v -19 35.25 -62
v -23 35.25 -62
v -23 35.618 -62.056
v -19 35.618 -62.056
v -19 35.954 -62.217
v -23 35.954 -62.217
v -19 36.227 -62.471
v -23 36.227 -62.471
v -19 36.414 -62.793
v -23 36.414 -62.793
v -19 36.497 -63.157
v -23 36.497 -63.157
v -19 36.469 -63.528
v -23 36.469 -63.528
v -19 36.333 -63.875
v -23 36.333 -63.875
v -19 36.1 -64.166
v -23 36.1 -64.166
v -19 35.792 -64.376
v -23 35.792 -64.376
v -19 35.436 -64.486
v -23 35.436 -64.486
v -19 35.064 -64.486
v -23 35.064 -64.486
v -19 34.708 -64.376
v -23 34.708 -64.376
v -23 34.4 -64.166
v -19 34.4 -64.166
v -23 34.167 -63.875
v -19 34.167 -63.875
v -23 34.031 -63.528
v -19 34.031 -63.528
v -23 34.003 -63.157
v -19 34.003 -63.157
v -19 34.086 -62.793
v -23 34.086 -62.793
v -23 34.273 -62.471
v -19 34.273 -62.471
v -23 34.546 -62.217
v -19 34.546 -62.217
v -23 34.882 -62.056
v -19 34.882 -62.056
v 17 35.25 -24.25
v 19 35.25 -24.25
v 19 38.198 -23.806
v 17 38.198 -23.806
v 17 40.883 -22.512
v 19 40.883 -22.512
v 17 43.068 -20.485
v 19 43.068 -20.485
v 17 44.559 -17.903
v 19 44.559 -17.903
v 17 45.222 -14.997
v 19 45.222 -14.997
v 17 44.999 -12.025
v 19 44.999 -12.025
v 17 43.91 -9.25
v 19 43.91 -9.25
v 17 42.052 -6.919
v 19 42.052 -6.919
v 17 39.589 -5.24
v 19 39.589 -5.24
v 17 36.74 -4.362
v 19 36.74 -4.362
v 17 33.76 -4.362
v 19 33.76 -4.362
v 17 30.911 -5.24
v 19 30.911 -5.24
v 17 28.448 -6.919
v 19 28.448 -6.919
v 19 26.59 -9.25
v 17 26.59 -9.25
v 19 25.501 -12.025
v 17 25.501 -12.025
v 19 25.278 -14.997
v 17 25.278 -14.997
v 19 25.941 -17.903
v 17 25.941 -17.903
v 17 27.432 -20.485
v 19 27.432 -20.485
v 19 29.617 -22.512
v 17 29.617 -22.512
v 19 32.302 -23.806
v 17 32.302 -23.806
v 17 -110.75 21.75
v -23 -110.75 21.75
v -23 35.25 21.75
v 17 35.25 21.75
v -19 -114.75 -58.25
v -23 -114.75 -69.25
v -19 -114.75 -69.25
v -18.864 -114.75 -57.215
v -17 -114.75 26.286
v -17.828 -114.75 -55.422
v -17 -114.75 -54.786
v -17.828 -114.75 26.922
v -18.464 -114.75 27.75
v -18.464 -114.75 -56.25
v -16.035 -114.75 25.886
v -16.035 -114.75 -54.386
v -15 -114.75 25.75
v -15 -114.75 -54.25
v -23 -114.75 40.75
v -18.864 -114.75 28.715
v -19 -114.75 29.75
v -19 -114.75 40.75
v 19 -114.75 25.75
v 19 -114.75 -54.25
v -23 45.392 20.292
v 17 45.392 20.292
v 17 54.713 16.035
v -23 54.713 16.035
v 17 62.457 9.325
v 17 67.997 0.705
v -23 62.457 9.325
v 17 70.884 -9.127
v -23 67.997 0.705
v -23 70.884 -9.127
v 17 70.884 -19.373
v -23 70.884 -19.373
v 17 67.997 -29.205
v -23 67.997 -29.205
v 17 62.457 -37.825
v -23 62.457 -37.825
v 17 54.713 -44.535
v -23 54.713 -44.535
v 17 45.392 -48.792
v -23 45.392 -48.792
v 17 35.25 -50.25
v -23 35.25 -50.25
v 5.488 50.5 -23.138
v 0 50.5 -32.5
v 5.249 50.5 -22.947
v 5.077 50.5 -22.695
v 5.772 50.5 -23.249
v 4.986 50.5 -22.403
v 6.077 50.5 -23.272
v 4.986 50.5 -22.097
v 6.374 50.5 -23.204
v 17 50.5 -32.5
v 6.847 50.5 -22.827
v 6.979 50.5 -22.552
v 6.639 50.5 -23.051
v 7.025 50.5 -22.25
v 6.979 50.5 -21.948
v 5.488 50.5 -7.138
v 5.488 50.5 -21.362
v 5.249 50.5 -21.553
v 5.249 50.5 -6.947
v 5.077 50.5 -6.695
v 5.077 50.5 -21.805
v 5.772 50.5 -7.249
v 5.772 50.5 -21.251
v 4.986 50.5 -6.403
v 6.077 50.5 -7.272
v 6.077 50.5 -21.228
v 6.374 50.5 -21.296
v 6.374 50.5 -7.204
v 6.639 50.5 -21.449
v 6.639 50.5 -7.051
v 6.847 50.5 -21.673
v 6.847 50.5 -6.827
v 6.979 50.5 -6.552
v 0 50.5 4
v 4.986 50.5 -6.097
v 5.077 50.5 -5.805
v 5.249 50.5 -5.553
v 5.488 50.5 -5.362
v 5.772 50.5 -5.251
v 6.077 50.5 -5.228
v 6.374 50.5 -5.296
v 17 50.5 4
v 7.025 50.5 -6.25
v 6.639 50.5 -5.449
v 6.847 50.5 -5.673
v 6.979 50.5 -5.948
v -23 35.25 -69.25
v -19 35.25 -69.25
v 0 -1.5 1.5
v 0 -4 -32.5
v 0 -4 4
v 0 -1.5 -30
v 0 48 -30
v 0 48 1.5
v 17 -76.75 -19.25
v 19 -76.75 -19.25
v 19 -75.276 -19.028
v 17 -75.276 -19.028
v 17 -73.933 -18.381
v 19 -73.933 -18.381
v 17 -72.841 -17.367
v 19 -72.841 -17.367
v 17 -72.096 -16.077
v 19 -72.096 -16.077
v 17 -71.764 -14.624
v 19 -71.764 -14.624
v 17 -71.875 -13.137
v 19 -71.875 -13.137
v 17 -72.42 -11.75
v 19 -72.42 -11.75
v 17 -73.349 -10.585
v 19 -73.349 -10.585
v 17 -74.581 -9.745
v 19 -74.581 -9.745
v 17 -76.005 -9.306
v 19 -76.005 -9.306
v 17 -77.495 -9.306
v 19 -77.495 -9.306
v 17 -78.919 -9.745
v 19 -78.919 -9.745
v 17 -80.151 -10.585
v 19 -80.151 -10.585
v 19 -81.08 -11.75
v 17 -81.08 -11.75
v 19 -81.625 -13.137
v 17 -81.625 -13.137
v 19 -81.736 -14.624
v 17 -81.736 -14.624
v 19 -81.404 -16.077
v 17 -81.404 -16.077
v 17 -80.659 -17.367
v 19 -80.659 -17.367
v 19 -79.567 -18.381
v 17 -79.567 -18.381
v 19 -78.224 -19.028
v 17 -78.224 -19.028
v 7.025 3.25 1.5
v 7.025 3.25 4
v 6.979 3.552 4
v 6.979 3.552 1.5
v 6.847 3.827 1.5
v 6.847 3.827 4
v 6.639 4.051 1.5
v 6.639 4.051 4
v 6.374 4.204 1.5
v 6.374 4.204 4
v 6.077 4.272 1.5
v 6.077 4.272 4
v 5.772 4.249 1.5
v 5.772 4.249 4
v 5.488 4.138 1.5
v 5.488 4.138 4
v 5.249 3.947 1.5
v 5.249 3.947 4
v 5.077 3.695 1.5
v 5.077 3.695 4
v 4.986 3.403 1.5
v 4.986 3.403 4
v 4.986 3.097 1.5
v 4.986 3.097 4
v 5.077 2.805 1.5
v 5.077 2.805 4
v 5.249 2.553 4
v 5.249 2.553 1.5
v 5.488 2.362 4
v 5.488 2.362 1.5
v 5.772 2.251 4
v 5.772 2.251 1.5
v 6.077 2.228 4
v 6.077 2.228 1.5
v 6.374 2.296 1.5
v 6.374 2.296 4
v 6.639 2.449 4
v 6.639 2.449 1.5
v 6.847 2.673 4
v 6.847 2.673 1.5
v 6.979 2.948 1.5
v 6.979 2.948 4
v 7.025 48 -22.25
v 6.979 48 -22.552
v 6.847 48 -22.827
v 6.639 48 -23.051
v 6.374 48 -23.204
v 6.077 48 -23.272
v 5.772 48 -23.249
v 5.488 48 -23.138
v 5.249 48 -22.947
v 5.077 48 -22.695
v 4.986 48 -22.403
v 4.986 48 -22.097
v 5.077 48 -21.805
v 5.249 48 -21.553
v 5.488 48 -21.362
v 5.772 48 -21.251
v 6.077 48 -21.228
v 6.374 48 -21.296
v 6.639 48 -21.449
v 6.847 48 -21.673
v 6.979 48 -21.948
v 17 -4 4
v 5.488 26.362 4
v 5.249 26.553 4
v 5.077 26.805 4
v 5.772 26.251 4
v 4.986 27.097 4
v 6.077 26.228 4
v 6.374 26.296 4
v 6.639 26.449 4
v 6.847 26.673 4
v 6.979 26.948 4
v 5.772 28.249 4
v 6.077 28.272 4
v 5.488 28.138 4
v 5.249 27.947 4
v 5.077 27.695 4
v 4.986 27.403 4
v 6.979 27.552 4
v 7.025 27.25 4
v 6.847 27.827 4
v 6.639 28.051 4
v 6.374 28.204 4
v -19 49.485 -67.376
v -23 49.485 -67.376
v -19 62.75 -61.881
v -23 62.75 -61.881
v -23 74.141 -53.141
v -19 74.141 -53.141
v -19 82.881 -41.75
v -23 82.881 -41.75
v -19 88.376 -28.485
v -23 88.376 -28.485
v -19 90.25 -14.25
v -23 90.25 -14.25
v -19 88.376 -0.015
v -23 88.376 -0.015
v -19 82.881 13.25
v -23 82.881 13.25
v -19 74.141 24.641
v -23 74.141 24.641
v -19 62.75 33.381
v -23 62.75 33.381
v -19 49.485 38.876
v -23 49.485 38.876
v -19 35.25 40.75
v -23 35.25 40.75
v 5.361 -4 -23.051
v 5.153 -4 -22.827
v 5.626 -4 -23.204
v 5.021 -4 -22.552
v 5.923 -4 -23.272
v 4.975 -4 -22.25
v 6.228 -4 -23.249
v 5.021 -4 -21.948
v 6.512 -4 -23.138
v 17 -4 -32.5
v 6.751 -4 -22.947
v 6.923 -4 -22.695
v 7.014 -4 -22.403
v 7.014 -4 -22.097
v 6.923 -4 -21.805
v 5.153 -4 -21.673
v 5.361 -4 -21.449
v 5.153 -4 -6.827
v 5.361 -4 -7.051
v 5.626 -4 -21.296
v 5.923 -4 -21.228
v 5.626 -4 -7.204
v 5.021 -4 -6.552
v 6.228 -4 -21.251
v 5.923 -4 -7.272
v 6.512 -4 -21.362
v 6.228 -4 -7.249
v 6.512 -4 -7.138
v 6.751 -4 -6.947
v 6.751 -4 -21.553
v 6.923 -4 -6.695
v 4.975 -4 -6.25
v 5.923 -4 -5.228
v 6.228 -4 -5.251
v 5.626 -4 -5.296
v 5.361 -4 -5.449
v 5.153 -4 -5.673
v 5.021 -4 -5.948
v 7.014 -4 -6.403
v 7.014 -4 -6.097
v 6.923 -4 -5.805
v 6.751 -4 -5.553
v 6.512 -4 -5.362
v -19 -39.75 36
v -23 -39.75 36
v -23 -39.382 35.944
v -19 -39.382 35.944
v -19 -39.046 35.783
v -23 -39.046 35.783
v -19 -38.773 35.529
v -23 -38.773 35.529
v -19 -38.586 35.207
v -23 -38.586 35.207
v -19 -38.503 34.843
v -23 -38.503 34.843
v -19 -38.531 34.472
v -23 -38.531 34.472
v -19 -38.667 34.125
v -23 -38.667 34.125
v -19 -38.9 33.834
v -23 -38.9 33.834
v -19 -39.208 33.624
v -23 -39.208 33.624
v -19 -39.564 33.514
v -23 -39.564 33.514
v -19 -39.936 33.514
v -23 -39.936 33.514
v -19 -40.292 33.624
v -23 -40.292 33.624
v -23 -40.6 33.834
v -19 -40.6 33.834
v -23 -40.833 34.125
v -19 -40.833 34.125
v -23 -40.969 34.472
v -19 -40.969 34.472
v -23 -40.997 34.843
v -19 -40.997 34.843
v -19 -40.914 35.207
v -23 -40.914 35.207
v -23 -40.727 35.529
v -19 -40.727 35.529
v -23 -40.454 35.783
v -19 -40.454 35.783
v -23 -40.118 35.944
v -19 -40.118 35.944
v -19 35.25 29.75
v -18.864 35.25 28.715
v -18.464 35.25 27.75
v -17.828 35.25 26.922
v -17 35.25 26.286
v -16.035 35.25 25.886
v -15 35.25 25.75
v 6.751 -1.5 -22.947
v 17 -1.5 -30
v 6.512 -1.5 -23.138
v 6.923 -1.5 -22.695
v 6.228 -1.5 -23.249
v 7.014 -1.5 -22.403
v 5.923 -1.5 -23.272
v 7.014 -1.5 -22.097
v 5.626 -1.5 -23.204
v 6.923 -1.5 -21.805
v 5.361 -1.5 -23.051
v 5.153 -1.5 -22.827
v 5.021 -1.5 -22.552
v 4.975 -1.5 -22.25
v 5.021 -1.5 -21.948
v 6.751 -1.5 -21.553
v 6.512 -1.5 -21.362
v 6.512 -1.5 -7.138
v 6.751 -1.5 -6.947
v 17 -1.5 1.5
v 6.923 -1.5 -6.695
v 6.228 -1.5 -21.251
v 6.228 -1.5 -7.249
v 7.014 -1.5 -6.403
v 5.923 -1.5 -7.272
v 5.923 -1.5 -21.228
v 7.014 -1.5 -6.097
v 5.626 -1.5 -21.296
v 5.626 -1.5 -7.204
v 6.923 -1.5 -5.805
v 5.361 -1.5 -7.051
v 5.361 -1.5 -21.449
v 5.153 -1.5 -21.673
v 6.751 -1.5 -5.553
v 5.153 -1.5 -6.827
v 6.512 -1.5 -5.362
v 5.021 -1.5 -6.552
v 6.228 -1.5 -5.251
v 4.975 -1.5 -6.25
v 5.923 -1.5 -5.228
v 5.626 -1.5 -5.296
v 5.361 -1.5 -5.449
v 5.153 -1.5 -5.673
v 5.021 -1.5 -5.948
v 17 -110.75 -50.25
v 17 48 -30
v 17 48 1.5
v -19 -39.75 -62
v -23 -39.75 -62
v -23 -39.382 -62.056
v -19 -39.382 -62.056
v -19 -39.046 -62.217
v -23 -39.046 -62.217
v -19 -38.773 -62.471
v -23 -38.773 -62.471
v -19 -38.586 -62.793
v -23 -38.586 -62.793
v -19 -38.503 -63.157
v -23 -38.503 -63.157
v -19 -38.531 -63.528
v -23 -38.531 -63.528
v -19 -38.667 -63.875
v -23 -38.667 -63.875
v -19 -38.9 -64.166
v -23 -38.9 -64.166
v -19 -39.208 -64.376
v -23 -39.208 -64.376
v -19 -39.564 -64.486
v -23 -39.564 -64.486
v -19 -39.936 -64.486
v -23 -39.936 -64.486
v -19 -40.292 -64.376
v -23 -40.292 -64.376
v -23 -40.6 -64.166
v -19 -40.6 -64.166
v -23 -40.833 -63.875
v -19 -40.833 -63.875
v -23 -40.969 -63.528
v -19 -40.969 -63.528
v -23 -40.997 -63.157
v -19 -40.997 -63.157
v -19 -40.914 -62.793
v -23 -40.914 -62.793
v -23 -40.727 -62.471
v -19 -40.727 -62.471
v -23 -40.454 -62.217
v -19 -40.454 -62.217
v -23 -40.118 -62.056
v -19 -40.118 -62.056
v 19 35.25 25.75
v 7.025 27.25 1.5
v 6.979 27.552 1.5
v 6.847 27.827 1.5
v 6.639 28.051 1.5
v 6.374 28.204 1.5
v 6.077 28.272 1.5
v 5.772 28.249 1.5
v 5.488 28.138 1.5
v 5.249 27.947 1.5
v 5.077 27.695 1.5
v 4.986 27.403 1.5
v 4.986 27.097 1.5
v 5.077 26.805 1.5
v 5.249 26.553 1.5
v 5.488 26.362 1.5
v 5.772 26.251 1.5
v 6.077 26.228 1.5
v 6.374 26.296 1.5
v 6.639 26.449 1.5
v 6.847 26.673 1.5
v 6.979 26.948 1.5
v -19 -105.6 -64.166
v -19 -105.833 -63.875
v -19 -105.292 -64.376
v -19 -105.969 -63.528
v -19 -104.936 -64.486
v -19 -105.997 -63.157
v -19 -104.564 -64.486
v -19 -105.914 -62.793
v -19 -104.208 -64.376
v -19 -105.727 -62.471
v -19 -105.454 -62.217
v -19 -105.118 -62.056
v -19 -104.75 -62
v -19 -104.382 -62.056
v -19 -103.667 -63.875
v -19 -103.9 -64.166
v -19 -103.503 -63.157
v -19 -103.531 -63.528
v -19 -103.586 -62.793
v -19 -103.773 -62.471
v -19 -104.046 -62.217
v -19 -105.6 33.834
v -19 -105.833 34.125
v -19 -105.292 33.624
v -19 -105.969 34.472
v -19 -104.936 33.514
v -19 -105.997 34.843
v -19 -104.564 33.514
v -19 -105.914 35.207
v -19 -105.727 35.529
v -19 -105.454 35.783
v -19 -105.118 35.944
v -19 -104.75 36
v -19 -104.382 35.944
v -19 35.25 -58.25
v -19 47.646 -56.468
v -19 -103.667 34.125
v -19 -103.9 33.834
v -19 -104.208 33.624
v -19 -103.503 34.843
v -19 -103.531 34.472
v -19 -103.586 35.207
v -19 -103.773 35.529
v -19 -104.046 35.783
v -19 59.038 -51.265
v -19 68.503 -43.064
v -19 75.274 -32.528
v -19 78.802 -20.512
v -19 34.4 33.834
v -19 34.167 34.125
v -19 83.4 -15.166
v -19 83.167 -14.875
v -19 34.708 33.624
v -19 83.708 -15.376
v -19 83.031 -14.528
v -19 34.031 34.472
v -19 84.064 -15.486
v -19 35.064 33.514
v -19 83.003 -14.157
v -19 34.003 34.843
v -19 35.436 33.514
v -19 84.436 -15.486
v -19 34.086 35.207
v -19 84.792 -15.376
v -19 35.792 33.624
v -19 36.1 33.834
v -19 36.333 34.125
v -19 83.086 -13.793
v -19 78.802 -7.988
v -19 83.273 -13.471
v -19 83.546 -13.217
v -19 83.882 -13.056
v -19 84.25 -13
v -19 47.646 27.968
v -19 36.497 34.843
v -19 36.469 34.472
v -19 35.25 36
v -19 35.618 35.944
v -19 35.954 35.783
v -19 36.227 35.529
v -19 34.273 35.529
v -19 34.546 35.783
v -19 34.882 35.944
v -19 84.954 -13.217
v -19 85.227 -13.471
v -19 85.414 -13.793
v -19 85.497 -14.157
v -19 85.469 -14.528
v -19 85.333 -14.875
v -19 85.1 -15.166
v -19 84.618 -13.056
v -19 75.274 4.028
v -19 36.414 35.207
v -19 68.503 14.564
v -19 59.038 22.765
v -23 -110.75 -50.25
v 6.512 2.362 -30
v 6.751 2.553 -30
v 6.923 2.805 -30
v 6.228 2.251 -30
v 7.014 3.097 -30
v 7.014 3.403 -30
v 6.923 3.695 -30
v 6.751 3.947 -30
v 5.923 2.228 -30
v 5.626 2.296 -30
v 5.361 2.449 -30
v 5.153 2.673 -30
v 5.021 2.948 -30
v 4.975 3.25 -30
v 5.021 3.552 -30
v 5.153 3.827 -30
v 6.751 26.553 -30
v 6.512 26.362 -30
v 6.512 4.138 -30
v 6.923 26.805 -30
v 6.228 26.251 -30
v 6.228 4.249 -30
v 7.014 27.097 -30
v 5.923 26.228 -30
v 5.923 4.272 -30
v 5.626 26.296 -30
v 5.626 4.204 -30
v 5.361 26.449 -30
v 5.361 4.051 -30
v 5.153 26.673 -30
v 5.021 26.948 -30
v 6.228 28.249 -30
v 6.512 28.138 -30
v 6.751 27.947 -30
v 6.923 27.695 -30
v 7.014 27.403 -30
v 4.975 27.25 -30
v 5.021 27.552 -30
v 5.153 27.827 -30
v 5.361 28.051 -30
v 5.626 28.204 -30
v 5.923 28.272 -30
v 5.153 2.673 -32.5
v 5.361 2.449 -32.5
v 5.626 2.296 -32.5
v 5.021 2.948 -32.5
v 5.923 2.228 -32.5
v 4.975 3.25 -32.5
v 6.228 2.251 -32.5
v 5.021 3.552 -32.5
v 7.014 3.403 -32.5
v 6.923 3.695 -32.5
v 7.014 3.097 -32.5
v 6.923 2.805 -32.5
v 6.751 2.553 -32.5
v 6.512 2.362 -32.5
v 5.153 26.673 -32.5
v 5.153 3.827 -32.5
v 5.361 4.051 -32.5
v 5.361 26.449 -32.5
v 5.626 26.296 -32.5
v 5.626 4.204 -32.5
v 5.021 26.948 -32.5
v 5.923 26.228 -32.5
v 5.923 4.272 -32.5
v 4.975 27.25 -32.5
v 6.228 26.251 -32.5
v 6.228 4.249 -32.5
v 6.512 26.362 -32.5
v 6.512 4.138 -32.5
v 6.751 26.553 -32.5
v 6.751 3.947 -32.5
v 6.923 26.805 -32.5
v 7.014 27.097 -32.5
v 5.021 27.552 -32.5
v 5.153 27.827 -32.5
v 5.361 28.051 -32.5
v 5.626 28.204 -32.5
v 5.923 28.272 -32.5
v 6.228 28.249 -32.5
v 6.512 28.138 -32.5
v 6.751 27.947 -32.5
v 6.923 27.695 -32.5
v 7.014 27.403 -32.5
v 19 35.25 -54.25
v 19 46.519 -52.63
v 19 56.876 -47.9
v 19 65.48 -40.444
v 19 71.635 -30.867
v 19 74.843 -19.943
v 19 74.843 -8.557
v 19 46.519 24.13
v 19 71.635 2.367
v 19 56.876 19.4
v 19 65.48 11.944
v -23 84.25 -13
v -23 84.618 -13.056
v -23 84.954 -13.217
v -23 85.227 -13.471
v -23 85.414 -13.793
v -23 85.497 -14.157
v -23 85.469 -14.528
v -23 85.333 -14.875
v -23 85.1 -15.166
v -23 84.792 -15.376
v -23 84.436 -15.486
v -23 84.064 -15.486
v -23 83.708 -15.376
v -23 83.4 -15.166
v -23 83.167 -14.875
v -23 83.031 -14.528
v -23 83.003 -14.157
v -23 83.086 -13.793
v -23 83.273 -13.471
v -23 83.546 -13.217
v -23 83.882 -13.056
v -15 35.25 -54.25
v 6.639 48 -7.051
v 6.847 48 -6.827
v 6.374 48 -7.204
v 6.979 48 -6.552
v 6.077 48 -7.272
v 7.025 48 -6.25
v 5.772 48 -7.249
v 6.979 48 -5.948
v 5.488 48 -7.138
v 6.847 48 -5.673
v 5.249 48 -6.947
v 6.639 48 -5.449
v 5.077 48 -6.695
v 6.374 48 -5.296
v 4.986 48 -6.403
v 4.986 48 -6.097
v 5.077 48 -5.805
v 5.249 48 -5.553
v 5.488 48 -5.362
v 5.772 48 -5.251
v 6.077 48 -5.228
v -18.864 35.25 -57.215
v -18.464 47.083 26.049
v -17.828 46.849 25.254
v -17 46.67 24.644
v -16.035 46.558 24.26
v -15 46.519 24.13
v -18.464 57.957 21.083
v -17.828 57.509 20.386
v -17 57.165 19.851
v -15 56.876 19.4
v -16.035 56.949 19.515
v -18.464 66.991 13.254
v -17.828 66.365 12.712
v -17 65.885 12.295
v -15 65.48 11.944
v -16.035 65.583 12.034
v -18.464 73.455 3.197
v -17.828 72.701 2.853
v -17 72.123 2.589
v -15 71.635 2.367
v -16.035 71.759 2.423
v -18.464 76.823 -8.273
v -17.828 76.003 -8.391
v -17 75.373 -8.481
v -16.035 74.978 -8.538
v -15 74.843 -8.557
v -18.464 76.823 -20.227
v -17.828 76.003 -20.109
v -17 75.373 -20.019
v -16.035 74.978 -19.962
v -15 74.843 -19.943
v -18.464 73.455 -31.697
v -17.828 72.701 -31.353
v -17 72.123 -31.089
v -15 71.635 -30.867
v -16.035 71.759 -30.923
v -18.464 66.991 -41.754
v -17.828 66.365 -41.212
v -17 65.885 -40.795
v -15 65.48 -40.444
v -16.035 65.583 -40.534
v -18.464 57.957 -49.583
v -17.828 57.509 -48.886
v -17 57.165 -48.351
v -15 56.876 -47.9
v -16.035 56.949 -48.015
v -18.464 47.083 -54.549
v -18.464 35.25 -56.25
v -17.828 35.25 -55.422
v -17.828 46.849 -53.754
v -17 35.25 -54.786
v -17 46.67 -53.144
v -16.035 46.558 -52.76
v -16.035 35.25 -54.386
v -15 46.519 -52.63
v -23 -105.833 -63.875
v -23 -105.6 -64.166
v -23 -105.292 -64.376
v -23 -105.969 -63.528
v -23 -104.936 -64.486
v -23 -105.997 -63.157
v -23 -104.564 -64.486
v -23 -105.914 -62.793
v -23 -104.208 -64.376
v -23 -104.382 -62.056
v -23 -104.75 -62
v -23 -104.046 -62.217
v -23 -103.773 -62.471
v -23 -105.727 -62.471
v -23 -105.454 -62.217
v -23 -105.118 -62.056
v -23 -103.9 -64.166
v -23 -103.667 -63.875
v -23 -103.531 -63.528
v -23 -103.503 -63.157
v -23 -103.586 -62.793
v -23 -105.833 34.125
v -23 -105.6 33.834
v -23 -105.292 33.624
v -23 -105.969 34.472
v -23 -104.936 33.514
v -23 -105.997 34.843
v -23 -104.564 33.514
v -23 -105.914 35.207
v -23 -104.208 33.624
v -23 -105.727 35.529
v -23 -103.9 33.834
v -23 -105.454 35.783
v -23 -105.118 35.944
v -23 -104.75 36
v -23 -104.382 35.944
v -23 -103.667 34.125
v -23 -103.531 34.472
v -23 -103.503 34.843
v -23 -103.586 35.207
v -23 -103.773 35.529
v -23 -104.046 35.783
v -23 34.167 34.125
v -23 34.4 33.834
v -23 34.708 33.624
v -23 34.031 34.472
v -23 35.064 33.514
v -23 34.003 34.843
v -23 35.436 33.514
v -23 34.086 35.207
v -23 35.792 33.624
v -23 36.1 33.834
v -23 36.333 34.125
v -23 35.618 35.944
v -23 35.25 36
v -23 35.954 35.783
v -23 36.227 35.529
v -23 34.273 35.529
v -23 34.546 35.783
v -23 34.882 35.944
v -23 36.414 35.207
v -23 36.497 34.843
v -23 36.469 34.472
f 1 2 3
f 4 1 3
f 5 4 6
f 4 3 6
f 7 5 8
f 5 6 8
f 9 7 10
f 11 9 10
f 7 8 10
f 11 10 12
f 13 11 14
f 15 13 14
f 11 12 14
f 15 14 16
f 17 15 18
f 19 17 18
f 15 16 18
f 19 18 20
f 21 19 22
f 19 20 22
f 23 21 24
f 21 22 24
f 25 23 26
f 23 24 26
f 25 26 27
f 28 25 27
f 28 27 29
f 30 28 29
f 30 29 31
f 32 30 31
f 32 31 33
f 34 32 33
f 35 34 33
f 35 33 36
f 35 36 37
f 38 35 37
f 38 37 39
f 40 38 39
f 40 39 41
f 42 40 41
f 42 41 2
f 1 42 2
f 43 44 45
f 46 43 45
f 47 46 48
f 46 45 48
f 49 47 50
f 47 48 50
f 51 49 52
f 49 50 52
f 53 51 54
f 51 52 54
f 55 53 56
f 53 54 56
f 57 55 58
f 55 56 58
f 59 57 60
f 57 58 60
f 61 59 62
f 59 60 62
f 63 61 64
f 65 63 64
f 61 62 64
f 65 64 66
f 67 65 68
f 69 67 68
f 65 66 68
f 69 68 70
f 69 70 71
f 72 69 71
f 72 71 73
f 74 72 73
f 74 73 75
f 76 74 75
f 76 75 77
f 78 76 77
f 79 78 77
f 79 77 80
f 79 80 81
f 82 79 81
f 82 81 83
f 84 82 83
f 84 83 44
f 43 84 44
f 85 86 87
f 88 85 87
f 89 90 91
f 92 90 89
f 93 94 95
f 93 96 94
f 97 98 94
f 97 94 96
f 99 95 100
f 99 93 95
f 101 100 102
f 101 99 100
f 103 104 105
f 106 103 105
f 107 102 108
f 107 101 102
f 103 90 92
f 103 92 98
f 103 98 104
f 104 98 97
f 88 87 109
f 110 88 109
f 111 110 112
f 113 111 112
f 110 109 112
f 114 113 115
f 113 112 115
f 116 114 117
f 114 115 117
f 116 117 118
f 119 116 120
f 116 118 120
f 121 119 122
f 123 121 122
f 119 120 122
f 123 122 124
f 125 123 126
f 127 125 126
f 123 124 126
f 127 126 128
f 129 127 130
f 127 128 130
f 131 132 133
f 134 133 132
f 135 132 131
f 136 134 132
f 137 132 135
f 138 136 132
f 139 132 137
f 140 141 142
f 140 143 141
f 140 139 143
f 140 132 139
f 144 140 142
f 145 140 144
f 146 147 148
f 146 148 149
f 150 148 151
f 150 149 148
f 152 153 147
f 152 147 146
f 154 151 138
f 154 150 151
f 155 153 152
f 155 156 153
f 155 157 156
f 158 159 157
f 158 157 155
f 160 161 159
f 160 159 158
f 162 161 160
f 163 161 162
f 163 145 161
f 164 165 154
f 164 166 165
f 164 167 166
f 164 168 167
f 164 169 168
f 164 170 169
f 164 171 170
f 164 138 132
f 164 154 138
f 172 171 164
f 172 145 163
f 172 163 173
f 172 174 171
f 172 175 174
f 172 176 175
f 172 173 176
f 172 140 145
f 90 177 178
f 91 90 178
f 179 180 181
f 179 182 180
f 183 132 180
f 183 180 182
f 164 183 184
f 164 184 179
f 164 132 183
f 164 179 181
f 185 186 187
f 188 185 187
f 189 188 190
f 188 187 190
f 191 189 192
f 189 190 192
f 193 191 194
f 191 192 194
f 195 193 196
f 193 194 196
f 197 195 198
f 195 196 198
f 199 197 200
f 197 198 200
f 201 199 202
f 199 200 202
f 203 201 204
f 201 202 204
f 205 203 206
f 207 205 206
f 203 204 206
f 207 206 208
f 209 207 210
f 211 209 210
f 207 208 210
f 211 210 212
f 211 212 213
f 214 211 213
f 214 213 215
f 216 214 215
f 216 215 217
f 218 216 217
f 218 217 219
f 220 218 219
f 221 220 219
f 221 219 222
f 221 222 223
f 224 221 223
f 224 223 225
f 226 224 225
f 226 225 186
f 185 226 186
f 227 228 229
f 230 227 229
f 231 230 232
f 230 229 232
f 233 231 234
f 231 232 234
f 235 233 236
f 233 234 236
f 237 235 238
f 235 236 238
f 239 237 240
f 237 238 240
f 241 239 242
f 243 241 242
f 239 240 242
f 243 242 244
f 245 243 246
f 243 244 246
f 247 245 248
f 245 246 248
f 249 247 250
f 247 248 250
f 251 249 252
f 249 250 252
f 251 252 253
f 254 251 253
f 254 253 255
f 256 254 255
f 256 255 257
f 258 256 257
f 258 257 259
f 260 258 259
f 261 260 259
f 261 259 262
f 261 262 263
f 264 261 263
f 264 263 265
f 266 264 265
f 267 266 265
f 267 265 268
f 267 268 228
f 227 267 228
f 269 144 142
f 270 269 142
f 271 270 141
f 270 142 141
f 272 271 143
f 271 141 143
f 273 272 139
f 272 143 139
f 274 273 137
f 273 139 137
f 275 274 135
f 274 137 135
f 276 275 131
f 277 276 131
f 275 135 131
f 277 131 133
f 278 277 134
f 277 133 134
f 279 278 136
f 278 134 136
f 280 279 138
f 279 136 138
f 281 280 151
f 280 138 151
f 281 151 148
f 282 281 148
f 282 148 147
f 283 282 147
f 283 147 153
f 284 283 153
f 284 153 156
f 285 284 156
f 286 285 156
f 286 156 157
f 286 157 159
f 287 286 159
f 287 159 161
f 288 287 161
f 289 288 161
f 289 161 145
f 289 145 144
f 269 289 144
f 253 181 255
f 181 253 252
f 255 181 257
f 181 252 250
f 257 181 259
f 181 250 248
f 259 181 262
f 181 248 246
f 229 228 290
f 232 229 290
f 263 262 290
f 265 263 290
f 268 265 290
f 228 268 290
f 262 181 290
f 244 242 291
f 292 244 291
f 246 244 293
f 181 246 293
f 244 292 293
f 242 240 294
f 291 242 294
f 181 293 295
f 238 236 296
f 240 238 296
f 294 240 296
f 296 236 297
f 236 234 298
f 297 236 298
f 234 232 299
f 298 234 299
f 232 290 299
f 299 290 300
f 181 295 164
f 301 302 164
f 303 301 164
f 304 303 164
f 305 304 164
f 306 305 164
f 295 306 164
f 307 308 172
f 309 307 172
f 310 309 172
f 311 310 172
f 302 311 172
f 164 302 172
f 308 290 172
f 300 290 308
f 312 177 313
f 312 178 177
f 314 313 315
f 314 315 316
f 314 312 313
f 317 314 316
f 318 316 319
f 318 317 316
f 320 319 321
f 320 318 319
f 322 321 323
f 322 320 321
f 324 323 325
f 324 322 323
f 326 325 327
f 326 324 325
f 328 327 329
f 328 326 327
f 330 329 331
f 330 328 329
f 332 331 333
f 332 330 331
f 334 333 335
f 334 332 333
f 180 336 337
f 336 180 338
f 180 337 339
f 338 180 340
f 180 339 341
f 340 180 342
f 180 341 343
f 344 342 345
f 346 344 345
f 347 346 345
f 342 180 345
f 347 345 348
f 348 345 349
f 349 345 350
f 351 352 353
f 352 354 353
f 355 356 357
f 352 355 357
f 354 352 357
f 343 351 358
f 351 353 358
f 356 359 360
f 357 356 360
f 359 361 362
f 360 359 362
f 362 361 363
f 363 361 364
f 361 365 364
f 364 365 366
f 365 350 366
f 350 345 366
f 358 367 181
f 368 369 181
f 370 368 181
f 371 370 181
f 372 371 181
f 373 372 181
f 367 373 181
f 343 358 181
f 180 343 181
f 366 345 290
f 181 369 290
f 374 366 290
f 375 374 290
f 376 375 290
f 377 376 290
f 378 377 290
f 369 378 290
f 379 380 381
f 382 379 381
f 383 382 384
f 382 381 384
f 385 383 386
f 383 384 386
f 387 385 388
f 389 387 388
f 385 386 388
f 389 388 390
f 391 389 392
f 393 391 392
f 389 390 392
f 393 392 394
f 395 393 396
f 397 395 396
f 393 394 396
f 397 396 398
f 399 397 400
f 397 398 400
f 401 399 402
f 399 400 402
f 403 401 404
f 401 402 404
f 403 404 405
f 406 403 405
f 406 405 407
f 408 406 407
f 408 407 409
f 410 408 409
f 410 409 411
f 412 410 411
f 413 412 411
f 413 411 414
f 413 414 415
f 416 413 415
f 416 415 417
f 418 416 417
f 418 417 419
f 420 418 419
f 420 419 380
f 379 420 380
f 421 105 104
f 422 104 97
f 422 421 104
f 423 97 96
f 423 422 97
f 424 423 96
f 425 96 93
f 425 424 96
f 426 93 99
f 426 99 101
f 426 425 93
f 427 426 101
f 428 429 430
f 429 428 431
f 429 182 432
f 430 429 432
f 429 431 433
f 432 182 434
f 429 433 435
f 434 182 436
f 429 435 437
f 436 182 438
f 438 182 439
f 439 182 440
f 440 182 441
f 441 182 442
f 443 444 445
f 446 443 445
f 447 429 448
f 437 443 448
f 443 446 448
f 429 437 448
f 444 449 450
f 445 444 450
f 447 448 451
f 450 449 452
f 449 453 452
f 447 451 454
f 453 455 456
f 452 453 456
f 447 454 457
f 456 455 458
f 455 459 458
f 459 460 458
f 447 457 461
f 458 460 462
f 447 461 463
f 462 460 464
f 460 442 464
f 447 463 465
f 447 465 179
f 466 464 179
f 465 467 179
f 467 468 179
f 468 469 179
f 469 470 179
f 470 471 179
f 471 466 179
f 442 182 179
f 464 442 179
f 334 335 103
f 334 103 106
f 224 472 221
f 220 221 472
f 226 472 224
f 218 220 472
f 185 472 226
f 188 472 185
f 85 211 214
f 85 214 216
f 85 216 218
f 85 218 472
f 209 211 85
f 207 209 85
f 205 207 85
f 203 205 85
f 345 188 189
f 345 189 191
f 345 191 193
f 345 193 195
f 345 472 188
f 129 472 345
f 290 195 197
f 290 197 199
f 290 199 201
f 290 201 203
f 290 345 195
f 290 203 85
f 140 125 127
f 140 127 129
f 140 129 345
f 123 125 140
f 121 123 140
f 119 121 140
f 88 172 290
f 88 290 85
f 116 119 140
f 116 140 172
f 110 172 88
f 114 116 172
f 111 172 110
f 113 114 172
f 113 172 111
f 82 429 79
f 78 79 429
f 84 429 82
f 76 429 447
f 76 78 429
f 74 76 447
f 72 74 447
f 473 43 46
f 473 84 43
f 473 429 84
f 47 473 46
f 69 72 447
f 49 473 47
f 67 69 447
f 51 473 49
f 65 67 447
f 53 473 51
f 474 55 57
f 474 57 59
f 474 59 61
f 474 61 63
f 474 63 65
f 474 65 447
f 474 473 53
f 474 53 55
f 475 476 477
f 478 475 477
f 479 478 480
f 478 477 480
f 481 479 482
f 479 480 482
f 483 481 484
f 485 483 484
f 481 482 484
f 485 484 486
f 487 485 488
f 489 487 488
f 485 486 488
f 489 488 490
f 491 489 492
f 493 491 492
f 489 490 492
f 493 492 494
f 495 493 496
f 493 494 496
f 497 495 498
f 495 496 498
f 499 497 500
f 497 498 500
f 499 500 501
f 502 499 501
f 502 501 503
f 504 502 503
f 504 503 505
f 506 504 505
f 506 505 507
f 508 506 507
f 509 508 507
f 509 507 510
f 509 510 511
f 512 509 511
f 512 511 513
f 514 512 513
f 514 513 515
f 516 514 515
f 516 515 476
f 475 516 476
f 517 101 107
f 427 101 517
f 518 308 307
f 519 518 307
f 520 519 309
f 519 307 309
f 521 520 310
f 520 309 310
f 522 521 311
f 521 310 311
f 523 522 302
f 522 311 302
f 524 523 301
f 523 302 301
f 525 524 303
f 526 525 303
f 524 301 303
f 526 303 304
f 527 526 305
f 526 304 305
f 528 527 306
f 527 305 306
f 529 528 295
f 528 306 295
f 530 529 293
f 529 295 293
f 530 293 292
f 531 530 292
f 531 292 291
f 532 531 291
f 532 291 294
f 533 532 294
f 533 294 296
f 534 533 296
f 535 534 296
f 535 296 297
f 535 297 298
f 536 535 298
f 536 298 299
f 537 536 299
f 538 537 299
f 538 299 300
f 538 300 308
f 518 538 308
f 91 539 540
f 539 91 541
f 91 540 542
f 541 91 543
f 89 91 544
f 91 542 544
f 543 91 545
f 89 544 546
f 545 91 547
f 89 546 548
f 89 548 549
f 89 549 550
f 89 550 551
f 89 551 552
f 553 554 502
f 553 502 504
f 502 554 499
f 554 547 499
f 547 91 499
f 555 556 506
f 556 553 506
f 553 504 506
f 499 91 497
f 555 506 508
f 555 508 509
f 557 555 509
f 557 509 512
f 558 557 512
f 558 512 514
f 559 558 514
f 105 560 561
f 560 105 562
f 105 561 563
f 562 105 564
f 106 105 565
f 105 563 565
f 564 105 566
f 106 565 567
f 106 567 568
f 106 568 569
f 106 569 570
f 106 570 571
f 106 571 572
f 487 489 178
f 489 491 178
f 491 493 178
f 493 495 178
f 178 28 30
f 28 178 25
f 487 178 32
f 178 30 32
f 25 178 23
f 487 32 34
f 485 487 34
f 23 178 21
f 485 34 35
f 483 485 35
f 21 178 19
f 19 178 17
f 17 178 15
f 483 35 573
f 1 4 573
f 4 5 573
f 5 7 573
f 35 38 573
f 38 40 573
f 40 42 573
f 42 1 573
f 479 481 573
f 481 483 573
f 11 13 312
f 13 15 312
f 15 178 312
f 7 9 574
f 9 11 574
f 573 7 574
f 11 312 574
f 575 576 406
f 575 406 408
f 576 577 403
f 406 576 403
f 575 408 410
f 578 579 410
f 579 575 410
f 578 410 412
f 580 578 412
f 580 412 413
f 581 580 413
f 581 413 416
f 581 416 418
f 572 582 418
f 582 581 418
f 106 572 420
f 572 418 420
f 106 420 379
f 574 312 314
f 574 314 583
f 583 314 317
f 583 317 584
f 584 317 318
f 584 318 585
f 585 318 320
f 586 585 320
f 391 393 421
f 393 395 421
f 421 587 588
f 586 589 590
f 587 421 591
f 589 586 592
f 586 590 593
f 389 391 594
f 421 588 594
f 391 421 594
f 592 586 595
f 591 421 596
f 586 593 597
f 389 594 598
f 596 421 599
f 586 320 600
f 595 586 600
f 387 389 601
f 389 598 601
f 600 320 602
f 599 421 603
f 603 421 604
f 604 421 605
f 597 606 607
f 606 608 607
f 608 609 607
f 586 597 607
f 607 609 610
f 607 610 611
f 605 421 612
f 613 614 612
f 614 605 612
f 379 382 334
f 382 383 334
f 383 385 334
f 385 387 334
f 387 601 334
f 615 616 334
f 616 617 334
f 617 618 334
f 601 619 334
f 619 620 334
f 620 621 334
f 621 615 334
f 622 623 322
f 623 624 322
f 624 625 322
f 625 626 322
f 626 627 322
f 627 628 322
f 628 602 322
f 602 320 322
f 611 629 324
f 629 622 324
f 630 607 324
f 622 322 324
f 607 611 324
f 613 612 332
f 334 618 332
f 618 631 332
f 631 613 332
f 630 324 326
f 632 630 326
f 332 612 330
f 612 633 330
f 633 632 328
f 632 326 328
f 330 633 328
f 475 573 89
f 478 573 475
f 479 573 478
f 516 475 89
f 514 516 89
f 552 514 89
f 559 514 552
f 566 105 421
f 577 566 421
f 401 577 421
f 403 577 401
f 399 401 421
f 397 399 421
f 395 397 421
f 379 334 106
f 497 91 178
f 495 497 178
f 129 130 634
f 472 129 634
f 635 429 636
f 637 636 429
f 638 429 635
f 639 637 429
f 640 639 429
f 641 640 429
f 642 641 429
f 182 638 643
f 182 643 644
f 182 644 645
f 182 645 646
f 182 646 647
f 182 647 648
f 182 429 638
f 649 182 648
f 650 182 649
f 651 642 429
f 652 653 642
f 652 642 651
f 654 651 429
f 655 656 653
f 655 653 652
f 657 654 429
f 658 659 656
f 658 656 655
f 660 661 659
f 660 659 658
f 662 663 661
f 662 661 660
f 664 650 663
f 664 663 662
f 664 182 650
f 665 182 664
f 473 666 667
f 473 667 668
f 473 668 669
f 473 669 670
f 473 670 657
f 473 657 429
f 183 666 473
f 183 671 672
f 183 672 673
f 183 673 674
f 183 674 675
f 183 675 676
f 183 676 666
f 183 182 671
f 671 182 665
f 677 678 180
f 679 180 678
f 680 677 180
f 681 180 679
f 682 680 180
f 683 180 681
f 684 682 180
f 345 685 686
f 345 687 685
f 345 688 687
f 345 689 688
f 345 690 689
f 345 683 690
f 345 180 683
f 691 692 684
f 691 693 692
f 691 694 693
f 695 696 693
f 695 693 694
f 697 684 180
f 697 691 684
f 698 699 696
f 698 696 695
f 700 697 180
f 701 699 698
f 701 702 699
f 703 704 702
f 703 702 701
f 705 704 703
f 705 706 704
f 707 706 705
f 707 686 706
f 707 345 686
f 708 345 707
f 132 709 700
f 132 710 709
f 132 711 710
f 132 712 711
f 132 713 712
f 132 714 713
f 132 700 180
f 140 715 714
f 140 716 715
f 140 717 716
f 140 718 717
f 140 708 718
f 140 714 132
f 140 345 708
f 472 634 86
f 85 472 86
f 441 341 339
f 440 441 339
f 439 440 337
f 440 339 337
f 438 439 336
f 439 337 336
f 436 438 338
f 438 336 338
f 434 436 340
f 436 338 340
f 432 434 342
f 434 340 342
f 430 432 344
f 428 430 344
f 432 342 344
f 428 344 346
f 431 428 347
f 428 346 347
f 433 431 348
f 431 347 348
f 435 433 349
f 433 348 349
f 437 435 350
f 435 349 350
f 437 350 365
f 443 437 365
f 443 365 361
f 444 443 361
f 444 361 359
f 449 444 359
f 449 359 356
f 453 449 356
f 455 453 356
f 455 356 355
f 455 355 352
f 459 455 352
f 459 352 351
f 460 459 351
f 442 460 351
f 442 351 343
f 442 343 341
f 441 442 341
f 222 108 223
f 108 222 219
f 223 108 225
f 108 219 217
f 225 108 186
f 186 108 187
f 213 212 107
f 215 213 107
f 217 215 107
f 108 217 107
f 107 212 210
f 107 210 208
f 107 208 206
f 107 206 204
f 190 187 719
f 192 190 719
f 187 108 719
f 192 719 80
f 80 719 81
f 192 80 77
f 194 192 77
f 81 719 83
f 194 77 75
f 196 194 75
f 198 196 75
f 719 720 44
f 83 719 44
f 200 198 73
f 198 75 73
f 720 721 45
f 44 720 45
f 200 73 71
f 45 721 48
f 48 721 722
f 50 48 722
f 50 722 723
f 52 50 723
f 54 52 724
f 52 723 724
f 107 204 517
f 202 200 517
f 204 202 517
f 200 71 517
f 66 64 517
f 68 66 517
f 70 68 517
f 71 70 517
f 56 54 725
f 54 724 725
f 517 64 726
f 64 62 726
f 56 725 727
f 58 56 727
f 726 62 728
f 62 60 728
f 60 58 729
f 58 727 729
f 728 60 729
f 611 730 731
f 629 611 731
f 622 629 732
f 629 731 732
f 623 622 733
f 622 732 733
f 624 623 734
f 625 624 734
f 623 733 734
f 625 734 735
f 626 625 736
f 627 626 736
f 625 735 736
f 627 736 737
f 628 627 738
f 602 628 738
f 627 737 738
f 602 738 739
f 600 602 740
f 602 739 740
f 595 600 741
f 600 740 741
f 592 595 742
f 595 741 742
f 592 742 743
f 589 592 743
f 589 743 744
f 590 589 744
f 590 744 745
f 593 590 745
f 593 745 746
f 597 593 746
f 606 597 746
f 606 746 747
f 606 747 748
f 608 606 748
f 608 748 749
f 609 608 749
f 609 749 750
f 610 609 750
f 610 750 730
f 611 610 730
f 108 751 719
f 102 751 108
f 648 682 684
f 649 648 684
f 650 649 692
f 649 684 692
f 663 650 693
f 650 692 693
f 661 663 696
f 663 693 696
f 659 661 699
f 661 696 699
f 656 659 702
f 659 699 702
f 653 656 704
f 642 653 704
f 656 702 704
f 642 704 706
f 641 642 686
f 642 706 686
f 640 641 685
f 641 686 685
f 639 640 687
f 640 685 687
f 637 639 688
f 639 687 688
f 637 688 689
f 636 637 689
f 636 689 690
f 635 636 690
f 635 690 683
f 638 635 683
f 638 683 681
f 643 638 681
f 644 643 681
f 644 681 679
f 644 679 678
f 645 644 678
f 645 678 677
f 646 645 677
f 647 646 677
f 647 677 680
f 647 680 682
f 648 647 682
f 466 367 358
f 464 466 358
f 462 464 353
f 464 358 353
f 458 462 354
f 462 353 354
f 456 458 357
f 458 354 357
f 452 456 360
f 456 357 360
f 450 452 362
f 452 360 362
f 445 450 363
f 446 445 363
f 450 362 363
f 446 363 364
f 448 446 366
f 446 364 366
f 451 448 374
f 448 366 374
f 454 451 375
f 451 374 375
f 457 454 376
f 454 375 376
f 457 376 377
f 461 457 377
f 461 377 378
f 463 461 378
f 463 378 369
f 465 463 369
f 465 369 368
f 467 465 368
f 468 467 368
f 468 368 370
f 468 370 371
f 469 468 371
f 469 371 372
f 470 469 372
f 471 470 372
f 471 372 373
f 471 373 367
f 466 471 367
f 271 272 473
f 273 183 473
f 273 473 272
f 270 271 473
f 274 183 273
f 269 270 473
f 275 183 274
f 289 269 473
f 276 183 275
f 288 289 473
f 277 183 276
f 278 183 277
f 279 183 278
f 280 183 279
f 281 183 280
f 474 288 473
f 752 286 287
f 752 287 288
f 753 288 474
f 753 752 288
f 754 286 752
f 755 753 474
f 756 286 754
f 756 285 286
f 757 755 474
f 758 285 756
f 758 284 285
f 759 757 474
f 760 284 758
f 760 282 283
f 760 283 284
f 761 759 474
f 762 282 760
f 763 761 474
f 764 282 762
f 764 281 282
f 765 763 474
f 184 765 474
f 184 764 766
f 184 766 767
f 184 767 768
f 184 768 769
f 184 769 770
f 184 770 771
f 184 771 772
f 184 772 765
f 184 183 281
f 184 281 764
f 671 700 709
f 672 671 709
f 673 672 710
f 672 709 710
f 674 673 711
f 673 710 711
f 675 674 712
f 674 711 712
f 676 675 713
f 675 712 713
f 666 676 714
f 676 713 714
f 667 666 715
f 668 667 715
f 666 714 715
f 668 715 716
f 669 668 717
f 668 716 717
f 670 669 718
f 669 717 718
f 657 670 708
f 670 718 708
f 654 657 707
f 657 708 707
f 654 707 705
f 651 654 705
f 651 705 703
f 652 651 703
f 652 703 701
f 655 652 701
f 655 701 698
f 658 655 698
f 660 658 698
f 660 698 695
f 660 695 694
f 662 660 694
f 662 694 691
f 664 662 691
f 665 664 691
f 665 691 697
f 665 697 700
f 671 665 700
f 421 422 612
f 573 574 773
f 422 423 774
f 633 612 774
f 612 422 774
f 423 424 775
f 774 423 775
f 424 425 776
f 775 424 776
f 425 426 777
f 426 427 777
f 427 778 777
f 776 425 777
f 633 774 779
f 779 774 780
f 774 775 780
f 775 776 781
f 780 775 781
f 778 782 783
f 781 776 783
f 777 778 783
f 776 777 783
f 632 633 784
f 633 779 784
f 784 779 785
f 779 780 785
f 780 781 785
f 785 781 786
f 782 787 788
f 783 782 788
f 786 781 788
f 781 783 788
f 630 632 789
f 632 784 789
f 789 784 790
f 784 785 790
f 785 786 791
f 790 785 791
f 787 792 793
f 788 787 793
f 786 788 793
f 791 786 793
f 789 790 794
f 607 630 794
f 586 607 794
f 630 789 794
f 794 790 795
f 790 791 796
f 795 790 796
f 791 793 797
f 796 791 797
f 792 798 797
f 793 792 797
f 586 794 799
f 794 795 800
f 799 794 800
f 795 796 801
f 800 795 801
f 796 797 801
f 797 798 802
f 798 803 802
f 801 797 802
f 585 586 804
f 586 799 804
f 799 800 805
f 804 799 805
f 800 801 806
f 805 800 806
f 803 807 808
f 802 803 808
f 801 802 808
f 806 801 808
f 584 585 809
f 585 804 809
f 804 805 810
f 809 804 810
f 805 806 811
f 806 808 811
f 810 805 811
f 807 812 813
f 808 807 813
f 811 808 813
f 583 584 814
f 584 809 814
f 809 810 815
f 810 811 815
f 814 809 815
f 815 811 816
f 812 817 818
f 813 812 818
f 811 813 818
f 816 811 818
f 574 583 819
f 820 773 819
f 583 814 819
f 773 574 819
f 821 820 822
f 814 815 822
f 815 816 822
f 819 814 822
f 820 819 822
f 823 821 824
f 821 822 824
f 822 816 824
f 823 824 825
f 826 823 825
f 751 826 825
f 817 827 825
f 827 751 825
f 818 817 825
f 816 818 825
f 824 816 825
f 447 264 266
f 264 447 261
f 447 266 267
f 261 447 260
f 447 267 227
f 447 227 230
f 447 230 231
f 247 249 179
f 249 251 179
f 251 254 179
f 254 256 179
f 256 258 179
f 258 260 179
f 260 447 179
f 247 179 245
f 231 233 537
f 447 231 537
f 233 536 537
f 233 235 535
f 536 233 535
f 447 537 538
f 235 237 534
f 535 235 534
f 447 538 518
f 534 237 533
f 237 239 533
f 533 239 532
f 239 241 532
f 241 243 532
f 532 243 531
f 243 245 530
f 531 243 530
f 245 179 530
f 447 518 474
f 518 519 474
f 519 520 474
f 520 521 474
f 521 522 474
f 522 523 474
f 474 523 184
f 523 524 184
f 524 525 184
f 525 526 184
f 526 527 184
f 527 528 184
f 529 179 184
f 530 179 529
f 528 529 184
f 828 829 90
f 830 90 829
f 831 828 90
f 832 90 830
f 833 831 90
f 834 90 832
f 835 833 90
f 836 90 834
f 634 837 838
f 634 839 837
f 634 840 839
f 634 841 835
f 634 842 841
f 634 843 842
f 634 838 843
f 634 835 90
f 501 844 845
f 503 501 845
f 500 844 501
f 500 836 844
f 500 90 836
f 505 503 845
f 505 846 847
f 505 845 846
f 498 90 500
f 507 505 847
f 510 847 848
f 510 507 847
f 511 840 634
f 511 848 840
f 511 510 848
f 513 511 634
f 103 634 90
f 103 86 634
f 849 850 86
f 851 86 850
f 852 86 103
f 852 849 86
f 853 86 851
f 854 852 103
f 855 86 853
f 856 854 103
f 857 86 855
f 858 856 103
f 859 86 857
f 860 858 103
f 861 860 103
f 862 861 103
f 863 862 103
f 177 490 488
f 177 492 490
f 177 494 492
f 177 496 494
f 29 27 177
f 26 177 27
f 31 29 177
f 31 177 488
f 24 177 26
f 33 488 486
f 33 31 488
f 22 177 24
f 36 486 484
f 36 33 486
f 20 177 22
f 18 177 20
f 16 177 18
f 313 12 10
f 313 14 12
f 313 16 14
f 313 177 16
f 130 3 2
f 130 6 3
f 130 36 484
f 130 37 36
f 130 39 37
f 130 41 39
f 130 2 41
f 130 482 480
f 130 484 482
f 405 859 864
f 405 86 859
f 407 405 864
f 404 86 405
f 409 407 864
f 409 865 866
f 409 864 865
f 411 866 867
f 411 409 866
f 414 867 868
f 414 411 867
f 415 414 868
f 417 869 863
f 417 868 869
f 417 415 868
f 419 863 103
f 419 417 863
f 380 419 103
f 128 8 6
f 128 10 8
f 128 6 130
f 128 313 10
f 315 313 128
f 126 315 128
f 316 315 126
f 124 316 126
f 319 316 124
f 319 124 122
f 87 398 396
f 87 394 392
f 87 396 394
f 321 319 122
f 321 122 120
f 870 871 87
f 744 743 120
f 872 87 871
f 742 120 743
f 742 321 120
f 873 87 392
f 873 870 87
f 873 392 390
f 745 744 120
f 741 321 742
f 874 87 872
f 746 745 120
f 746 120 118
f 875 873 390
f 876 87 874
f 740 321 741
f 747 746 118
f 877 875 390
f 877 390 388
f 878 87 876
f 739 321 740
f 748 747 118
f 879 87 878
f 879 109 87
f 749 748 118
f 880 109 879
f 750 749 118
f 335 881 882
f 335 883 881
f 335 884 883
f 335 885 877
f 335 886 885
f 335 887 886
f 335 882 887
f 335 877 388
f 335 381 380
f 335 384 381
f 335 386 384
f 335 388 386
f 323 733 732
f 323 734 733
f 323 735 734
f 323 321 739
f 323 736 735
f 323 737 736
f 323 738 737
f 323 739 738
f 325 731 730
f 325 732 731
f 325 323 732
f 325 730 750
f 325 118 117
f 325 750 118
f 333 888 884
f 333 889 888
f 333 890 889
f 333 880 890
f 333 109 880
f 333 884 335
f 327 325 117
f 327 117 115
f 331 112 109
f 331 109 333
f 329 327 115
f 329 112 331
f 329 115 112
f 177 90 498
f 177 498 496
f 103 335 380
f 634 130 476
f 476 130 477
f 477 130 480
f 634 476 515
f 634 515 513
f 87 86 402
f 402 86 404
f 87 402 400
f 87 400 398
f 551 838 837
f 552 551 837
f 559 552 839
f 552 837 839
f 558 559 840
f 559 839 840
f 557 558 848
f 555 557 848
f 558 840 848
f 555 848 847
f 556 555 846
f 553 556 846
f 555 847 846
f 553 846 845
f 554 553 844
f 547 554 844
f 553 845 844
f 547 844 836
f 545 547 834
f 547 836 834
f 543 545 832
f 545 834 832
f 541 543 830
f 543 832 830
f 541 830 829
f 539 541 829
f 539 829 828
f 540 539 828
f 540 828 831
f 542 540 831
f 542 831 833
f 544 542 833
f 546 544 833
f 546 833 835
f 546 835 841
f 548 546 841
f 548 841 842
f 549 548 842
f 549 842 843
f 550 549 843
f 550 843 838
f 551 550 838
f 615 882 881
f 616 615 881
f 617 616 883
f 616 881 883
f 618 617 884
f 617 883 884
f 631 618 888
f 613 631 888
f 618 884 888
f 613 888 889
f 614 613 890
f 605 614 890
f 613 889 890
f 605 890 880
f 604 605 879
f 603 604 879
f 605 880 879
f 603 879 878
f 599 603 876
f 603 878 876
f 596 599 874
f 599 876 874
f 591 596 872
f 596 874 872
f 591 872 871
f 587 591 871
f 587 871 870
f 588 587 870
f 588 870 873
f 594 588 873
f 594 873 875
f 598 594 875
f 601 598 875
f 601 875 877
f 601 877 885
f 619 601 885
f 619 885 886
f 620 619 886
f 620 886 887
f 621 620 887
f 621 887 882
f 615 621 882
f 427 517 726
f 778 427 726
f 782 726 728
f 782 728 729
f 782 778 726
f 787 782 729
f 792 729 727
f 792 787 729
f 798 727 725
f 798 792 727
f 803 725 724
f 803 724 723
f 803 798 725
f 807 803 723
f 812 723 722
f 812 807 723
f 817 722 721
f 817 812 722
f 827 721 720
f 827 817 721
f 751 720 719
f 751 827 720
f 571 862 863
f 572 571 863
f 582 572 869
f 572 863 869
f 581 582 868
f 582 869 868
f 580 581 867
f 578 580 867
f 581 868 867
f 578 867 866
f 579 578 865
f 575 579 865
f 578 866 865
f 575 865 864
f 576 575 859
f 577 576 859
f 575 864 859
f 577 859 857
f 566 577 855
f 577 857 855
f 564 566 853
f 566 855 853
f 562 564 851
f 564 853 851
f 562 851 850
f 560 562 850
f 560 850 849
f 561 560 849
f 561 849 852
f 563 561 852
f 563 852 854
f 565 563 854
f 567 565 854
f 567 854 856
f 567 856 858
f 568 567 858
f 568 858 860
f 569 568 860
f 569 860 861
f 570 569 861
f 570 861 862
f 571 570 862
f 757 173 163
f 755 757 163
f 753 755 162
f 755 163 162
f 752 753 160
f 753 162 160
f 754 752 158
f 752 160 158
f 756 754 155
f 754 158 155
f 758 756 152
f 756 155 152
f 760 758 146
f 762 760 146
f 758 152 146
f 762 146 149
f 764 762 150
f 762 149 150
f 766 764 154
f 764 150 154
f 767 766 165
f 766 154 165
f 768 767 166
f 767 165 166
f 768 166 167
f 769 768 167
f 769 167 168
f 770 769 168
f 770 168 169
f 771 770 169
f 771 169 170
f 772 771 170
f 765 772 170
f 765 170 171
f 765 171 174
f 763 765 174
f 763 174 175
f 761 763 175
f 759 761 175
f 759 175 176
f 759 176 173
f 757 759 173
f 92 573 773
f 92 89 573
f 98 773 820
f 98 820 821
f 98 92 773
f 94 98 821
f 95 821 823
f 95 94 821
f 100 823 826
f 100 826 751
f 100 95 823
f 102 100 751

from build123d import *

# Parameters (mm, degrees)
SKETCH_1_W                    = 4
SKETCH_1_H                    = 55
REVOLVE_1_ANGLE               = 180
SKETCH_2_W                    = 4
SKETCH_2_H                    = 110
EXTRUDE_1_DEPTH               = 150
EXTRUDE_2_DEPTH               = 38
CUT_EXTRUDE_1_DEPTH           = 40
SKETCH_5_W                    = 36.5
SKETCH_5_H                    = 54.5
EXTRUDE_3_DEPTH               = 17
SKETCH_6_W                    = 31.5
SKETCH_6_H                    = 49.5
CUT_EXTRUDE_2_DEPTH           = 17
HOLE_WIZARD_20_0_20_1_D       = 20
HOLE_WIZARD_20_0_20_1_DEPTH   = 2
HOLE_WIZARD_10_0_10_1_D       = 10
HOLE_WIZARD_10_0_10_1_DEPTH   = 2
HOLE_WIZARD_2_5_2_5_1_D       = 2.5
HOLE_WIZARD_2_5_2_5_1_DEPTH   = 4
HOLE_WIZARD_2_05_2_05_1_D     = 2.05
HOLE_WIZARD_2_05_2_05_1_DEPTH = 2.5
HOLE_WIZARD_2_05_2_05_2_D     = 2.05
HOLE_WIZARD_2_05_2_05_2_DEPTH = 2.5
HOLE_WIZARD_2_05_2_05_3_D     = 2.05
HOLE_WIZARD_2_05_2_05_3_DEPTH = 2.5
HOLE_WIZARD_2_05_2_05_4_D     = 2.05
HOLE_WIZARD_2_05_2_05_4_DEPTH = 2.5
FILLET_1_R                    = 4


with BuildPart() as part:
    # 스케치1 → 회전1 (revolve)
    with BuildSketch(Plane.XZ.offset(-35.25)):
        with Locations((-21, -41.75)):
            Rectangle(SKETCH_1_W, SKETCH_1_H)
    revolve(axis=Axis((-18.999896922, 35.25, -14.25), (1, 0, 0)), revolution_arc=REVOLVE_1_ANGLE)

    # 스케치2 → 보스-돌출1 (add)
    with BuildSketch(Plane.XZ.offset(-35.25)):
        with Locations((-21, -14.25)):
            Rectangle(SKETCH_2_W, SKETCH_2_H)
    extrude(amount=EXTRUDE_1_DEPTH)

    # 스케치3 → 보스-돌출2 (add)
    with BuildSketch(Plane(origin=(-19, 0, 0), x_dir=(0, 0, -1), z_dir=(1, 0, 0))):
        with BuildLine():
            Line((-25.75, -114.75), (-25.75, 35.25))
            ThreePointArc((-25.75, 35.25), (14.25, 75.25), (54.25, 35.25))
            Line((54.25, 35.25), (54.25, -114.75))
            Line((54.25, -114.75), (-25.75, -114.75))
        make_face()
    extrude(amount=EXTRUDE_2_DEPTH)

    # 스케치4 → 컷-돌출1 (cut)
    with BuildSketch(Plane.ZY.offset(23)):
        with BuildLine():
            Line((-50.25, -110.75), (21.75, -110.75))
            Line((21.75, -110.75), (21.75, 35.25))
            ThreePointArc((21.75, 35.25), (-14.25, 71.25), (-50.25, 35.25))
            Line((-50.25, 35.25), (-50.25, -110.75))
        make_face()
    extrude(amount=-CUT_EXTRUDE_1_DEPTH, mode=Mode.SUBTRACT)

    # 스케치5 → 보스-돌출3 (add)
    with BuildSketch(Plane.ZY.offset(-17)):
        with Locations((-14.25, 23.25)):
            Rectangle(SKETCH_5_W, SKETCH_5_H)
    extrude(amount=EXTRUDE_3_DEPTH)

    # 스케치6 → 컷-돌출2 (cut)
    with BuildSketch(Plane.ZY):
        with Locations((-14.25, 23.25)):
            Rectangle(SKETCH_6_W, SKETCH_6_H)
    extrude(amount=-CUT_EXTRUDE_2_DEPTH, mode=Mode.SUBTRACT)

    # Ø20.0 (20) 지름 구멍1
    with Locations(Plane.ZY.offset(-17)):
        with Locations((-14.25, 35.25)):
            Hole(HOLE_WIZARD_20_0_20_1_D / 2, depth=HOLE_WIZARD_20_0_20_1_DEPTH)

    # Ø10.0 (10) 지름 구멍1
    with Locations(Plane.ZY.offset(-17)):
        with Locations((-14.25, -76.75)):
            Hole(HOLE_WIZARD_10_0_10_1_D / 2, depth=HOLE_WIZARD_10_0_10_1_DEPTH)

    # Ø2.5 (2.5) 지름 구멍1
    with Locations(Plane(origin=(-19, 0, 0), x_dir=(0, 0, -1), z_dir=(1, 0, 0))):
        with Locations((-34.75, -104.75), (63.25, -104.75), (63.25, -39.75), (63.25, 35.25), (-34.75, 35.25), (-34.75, -39.75), (14.25, 84.25)):
            Hole(HOLE_WIZARD_2_5_2_5_1_D / 2, depth=HOLE_WIZARD_2_5_2_5_1_DEPTH)

    # Ø2.05 (2.05) 지름 구멍1
    with Locations(Plane(origin=(0, -1.5, 0), x_dir=(1, 0, 0), z_dir=(0, 1, 0))):
        with Locations((6, 6.25), (6, 22.25)):
            Hole(HOLE_WIZARD_2_05_2_05_1_D / 2, depth=HOLE_WIZARD_2_05_2_05_1_DEPTH)

    # Ø2.05 (2.05) 지름 구멍2
    with Locations(Plane(origin=(0, 0, 1.5), x_dir=(-1, 0, 0), z_dir=(0, 0, -1))):
        with Locations((-6, 27.25), (-6, 3.25)):
            Hole(HOLE_WIZARD_2_05_2_05_2_D / 2, depth=HOLE_WIZARD_2_05_2_05_2_DEPTH)

    # Ø2.05 (2.05) 지름 구멍3
    with Locations(Plane(origin=(0, 48, 0), x_dir=(-1, 0, 0), z_dir=(0, -1, 0))):
        with Locations((-6, 6.25), (-6, 22.25)):
            Hole(HOLE_WIZARD_2_05_2_05_3_D / 2, depth=HOLE_WIZARD_2_05_2_05_3_DEPTH)

    # Ø2.05 (2.05) 지름 구멍4
    with Locations(Plane.XY.offset(-30)):
        with Locations((6, 27.25), (6, 3.25)):
            Hole(HOLE_WIZARD_2_05_2_05_4_D / 2, depth=HOLE_WIZARD_2_05_2_05_4_DEPTH)

    # 필렛1
    fillet_1_edges = [part.edges().sort_by_distance(p)[0] for p in [
        (-19, -39.75, -54.25),
        (-19, 75.25, -14.25),
        (-19, -39.75, 25.75),
    ]]
    fillet(fillet_1_edges, radius=FILLET_1_R)


solid = part.part
